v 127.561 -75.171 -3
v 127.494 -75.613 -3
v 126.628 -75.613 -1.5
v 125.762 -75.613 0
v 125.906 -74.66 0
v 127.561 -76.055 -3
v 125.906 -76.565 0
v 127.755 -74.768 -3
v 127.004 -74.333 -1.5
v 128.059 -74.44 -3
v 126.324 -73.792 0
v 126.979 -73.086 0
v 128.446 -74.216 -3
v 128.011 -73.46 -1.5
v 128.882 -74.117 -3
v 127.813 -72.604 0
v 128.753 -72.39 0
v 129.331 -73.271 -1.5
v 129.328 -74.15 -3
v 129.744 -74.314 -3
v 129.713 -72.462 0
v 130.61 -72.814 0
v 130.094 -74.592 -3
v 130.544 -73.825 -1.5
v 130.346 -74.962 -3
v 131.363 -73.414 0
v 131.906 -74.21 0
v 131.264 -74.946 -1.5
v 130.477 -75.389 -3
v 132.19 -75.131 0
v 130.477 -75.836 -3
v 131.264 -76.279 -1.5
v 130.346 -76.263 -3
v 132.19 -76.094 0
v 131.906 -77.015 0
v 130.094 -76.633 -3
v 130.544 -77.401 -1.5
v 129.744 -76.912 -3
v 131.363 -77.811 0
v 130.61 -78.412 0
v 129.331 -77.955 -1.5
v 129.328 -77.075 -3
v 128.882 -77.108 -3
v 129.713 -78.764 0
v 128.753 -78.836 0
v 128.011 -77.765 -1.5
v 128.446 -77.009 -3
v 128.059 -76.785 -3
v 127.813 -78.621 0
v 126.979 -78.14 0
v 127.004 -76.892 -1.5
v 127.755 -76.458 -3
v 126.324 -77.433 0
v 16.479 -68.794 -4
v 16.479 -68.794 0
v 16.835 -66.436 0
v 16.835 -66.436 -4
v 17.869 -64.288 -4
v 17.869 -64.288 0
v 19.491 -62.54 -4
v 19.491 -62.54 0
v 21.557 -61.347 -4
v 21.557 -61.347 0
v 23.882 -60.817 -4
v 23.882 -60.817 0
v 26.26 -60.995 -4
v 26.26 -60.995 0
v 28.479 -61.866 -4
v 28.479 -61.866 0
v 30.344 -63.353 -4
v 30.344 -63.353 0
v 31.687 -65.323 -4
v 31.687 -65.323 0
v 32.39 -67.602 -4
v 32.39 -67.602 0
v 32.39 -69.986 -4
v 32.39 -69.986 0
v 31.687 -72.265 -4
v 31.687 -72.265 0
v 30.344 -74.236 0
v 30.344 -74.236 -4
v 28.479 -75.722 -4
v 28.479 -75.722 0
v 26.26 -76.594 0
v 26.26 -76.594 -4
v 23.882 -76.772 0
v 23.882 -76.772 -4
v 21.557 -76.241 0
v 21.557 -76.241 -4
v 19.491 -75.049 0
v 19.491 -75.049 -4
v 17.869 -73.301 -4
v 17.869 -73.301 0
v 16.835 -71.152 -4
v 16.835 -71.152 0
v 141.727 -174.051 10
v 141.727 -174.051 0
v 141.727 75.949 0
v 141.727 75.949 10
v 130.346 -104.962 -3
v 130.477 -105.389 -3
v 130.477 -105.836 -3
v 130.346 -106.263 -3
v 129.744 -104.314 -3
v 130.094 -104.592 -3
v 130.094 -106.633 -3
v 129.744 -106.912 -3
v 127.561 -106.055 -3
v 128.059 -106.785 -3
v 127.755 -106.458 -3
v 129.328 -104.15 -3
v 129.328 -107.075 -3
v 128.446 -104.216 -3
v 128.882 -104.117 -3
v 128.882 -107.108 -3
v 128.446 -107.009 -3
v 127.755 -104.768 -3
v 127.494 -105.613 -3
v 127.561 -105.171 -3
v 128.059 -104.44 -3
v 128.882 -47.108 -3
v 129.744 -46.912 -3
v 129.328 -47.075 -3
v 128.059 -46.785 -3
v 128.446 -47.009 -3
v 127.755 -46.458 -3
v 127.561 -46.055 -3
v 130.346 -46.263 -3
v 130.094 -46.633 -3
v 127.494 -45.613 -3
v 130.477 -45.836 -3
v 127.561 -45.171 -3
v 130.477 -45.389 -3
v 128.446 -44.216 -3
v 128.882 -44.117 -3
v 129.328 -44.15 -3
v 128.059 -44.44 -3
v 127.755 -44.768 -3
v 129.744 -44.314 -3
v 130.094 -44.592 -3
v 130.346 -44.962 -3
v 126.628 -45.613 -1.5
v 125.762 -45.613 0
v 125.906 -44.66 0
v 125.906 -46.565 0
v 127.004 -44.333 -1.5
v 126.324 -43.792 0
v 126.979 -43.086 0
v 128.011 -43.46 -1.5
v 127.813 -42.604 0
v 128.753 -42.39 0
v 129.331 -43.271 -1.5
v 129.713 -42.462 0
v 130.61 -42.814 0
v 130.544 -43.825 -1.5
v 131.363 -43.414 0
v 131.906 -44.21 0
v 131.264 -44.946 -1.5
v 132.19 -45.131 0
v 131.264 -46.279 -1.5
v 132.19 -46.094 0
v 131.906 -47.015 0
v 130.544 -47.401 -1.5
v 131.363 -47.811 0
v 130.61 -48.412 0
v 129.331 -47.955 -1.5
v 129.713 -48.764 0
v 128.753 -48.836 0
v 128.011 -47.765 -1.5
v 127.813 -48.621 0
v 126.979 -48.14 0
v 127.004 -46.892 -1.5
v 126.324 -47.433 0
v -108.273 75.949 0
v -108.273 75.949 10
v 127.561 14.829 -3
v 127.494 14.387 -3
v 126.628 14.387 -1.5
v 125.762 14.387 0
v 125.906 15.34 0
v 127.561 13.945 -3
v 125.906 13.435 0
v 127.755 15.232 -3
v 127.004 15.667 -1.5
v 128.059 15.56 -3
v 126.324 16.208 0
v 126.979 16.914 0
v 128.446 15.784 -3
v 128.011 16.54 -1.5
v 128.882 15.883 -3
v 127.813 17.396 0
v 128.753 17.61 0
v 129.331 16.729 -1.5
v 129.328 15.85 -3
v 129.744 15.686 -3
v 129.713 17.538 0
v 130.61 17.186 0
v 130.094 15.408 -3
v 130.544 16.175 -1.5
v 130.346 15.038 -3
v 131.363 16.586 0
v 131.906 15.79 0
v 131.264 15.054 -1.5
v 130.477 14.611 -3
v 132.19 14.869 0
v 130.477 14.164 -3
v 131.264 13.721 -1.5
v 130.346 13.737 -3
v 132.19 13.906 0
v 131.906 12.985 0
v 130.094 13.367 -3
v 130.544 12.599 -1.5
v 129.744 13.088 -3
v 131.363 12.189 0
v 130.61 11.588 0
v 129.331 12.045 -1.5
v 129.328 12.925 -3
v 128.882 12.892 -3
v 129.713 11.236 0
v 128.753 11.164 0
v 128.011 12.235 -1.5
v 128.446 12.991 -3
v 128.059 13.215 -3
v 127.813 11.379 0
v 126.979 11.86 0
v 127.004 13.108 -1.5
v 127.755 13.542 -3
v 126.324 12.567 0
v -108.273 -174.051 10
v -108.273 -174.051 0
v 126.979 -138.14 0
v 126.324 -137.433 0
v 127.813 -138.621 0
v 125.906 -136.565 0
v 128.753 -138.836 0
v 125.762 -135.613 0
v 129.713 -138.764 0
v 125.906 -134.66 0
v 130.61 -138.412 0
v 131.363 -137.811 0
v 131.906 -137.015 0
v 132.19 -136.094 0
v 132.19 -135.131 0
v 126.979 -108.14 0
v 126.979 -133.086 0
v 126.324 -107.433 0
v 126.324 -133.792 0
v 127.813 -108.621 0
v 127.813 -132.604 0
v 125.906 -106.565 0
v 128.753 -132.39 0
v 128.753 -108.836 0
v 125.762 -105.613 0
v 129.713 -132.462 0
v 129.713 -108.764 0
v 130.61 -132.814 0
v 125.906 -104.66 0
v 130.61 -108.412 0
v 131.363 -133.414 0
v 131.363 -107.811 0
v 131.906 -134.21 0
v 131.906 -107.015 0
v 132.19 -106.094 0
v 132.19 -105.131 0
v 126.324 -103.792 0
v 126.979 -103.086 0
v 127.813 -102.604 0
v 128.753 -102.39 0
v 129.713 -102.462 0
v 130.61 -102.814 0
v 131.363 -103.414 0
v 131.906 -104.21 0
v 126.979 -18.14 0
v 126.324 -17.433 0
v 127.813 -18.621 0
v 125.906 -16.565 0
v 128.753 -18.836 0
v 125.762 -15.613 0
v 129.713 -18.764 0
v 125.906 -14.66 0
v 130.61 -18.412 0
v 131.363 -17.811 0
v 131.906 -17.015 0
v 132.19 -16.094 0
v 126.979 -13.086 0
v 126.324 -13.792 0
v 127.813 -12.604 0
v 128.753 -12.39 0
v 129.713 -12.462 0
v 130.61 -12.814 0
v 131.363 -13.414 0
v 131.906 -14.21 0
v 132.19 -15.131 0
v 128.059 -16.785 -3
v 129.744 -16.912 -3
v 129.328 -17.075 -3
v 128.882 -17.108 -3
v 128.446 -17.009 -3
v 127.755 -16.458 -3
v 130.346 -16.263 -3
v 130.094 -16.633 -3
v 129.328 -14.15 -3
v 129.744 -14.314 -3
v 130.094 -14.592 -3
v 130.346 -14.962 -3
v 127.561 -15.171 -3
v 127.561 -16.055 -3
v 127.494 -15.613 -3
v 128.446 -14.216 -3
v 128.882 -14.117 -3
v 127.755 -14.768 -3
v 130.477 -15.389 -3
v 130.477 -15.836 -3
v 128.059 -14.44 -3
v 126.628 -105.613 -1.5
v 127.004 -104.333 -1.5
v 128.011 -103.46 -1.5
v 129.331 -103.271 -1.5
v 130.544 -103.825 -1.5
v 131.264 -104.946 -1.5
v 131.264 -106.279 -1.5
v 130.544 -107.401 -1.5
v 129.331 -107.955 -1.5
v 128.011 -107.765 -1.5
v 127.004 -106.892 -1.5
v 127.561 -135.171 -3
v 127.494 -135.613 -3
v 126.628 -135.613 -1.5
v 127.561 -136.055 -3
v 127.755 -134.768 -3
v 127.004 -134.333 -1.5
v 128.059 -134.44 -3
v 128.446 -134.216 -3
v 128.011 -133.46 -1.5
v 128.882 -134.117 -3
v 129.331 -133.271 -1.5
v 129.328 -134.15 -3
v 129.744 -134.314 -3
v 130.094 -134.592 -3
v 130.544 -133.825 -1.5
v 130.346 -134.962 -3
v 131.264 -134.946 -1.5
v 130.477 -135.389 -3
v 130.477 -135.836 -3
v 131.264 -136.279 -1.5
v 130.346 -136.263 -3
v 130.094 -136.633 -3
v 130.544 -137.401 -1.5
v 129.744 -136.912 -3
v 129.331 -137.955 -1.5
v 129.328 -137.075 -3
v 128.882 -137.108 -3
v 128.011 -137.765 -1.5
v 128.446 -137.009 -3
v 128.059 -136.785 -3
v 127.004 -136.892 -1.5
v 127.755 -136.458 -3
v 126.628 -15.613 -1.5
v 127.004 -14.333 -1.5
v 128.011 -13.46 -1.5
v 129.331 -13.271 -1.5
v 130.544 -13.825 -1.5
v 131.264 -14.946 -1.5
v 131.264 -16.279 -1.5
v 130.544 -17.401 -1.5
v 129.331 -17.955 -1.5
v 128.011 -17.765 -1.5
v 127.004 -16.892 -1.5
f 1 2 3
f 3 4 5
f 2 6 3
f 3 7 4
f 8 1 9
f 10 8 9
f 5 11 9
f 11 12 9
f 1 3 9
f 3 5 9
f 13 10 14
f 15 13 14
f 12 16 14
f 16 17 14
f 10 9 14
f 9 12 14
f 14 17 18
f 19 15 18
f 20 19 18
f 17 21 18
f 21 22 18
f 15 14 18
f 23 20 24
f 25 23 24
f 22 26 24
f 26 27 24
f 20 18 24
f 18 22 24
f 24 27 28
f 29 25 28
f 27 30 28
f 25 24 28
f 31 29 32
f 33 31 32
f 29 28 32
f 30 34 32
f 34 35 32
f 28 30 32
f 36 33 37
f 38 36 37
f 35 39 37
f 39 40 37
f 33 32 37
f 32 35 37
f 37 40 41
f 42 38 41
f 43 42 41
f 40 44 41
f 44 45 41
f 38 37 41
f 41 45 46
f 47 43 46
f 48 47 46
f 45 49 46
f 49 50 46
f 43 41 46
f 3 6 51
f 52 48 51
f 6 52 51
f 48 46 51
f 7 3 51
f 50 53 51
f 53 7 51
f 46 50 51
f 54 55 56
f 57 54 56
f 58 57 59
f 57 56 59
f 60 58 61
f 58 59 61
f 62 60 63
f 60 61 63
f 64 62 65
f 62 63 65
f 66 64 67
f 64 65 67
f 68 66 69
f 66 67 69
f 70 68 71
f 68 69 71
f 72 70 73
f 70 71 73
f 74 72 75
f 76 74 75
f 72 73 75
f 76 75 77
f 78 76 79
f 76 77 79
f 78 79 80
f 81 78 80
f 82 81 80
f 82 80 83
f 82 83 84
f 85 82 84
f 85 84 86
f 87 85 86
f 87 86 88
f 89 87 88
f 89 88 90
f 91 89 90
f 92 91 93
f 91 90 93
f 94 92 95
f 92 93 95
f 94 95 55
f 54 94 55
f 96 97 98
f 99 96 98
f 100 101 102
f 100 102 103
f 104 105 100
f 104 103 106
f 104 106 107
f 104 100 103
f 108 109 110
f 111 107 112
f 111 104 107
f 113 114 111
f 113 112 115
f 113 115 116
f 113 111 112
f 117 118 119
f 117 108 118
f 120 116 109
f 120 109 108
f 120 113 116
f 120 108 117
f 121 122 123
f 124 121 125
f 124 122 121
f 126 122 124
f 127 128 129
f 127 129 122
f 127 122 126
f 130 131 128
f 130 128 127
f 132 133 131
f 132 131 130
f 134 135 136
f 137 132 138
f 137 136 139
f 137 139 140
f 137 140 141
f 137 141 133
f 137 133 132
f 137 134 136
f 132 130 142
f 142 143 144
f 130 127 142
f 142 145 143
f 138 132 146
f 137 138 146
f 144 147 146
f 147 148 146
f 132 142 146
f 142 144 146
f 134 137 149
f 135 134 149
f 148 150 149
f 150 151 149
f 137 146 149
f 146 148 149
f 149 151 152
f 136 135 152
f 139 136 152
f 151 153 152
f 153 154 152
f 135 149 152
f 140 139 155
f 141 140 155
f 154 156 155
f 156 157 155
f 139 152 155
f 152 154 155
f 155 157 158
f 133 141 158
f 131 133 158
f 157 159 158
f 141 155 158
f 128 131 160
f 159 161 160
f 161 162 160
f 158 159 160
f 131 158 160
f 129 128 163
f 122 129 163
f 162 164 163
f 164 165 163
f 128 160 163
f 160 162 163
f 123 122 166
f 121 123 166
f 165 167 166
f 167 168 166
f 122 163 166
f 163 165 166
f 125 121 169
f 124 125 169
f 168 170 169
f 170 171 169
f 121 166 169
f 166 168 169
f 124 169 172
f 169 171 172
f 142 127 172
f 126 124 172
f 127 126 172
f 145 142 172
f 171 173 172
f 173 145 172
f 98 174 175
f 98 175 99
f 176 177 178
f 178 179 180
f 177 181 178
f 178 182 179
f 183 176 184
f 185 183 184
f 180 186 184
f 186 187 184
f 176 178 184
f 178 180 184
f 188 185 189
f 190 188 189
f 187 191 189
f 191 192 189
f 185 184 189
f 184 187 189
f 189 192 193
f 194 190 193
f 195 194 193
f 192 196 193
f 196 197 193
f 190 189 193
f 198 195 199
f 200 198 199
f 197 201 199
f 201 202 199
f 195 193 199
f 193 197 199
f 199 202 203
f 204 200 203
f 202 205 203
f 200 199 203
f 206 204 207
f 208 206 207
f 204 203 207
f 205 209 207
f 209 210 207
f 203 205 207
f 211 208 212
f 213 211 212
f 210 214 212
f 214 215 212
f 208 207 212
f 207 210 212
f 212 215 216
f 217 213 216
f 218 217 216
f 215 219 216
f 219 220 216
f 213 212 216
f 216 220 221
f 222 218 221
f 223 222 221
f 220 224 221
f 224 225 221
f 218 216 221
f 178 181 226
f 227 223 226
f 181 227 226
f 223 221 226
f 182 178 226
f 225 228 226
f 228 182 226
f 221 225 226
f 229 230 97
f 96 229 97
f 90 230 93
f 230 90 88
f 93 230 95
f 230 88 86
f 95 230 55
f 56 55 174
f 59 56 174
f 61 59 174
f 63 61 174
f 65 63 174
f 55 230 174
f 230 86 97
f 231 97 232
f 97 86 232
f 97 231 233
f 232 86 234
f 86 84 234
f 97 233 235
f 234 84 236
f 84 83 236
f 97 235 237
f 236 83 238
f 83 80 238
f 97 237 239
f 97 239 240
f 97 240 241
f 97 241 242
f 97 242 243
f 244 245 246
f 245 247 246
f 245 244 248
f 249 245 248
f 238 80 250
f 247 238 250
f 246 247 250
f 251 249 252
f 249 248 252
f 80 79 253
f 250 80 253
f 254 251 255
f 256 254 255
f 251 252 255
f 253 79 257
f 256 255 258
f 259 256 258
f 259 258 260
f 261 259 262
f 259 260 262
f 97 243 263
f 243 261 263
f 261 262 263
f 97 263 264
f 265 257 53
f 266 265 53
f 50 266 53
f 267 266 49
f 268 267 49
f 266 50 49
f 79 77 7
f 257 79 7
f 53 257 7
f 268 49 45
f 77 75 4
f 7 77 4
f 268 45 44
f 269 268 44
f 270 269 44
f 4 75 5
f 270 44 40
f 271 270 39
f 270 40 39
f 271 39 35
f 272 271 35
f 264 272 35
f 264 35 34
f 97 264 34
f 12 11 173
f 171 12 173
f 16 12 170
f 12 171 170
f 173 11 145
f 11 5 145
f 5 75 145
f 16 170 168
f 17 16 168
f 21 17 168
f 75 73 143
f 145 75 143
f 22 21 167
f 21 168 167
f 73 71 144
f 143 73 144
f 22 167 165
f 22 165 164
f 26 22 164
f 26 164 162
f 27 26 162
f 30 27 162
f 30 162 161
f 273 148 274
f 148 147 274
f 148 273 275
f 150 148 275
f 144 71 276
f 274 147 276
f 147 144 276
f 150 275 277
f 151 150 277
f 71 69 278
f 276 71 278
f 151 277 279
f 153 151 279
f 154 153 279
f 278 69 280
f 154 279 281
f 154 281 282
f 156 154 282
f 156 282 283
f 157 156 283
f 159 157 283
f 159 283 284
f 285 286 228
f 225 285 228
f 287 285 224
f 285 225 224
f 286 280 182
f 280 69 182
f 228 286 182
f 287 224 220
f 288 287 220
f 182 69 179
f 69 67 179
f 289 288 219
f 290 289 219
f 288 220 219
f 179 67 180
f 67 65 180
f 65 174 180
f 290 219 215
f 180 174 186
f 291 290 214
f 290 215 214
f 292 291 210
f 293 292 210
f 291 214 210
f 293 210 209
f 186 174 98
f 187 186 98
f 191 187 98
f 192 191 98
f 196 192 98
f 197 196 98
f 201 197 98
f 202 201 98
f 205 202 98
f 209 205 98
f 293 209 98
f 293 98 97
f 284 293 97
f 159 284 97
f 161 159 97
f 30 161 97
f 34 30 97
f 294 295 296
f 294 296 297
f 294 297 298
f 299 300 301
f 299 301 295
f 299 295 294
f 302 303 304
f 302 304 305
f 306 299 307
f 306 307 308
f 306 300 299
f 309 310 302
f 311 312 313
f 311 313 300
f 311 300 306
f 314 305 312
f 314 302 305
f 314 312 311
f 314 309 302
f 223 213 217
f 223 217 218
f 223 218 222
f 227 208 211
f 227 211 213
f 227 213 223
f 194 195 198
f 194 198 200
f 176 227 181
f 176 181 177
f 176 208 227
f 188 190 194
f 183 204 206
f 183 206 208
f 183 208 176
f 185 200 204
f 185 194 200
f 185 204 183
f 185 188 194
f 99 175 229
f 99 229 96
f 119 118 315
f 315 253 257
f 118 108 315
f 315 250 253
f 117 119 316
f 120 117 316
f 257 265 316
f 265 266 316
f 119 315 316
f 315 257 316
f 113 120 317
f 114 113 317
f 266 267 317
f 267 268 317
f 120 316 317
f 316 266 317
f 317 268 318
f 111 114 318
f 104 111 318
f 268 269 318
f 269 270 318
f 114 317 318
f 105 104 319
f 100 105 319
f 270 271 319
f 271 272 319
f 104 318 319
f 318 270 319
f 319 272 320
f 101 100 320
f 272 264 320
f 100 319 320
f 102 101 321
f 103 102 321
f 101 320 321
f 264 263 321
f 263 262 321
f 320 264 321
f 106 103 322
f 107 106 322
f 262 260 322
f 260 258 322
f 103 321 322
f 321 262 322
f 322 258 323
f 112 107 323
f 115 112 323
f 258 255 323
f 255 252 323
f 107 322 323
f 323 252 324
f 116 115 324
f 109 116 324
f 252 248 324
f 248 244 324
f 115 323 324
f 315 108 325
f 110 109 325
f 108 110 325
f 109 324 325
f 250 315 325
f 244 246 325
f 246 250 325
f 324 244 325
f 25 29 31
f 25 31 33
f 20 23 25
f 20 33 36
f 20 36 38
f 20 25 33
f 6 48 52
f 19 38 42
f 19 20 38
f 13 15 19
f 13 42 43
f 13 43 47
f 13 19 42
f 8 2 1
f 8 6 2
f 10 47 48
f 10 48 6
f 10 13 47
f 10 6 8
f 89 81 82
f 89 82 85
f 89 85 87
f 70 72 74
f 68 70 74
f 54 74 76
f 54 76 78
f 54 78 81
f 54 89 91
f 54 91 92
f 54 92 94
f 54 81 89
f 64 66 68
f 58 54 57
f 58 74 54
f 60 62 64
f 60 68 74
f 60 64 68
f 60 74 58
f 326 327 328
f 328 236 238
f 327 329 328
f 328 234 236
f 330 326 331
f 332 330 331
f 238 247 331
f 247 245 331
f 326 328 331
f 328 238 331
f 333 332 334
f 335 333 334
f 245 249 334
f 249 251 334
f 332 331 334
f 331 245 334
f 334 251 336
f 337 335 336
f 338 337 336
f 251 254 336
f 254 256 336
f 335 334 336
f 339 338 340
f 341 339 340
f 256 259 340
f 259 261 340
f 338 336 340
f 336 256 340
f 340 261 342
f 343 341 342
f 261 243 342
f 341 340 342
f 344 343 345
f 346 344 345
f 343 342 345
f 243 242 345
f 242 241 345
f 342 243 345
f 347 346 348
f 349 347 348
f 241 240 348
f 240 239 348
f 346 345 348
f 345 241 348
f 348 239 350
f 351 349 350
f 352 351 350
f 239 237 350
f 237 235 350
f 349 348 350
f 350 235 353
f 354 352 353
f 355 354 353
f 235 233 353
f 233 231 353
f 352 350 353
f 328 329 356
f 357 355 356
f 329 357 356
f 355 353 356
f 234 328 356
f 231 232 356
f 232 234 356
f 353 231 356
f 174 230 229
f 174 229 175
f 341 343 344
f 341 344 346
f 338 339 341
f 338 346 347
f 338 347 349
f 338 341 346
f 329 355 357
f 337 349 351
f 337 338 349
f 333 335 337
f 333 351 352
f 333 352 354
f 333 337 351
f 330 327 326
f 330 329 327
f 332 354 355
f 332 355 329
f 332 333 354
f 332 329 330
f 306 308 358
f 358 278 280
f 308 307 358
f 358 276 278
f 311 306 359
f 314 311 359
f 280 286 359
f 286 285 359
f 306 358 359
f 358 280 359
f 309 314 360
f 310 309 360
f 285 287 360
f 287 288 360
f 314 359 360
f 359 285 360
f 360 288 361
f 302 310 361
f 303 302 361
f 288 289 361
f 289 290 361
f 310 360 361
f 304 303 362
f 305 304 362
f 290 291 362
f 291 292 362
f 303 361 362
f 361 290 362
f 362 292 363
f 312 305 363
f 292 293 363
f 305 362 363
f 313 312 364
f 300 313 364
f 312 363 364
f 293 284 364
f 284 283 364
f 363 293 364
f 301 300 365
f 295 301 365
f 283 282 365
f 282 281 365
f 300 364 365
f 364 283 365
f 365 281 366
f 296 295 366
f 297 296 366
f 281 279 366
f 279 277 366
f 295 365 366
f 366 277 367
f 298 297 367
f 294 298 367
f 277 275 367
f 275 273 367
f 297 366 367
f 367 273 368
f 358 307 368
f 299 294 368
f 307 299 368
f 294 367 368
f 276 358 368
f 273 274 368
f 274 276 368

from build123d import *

# Parameters (mm, degrees)
SKETCH_1_W             = 250
SKETCH_1_H             = 250
EXTRUDE_1_DEPTH        = 10
SKETCH_4_R             = 8
EXTRUDE_2_DEPTH        = 4
SKETCH_6_R             = 1.5
EXTRUDE_3_DEPTH        = 3
PATTERN_LINEAR_1_COUNT = 6
PATTERN_LINEAR_1_PITCH = 30
DRAFT_1_ANGLE          = 30
PATTERN_LINEAR_2_COUNT = 6
PATTERN_LINEAR_2_PITCH = 30
DRAFT_2_ANGLE          = 30
DRAFT_3_ANGLE          = 30
DRAFT_4_ANGLE          = 30
DRAFT_5_ANGLE          = 30
DRAFT_6_ANGLE          = 30


with BuildPart() as part:
    # 草图1 → 凸台-拉伸1 (new body)
    with BuildSketch(Plane.XY):
        with Locations((16.726943942, -49.050632911)):
            Rectangle(SKETCH_1_W, SKETCH_1_H)
    extrude(amount=EXTRUDE_1_DEPTH)

    # 草图4 → 凸台-拉伸2 (add)
    with BuildSketch(Plane(origin=(0, 0, 0), x_dir=(-1, 0, 0), z_dir=(0, 0, -1))):
        with Locations((-24.479358253, -68.79415652)):
            Circle(SKETCH_4_R)
    extrude(amount=EXTRUDE_2_DEPTH)

    # 草图6 → 凸台-拉伸3 (add)
    with BuildSketch(Plane(origin=(0, 0, 0), x_dir=(-1, 0, 0), z_dir=(0, 0, -1))):
        with Locations((-128.994191702, 14.387355328)):
            Circle(SKETCH_6_R)
    extrude_3 = extrude(amount=EXTRUDE_3_DEPTH)

    # 阵列(线性)1: 凸台-拉伸3 ×6
    with Locations(*[(0, -i * PATTERN_LINEAR_1_PITCH, 0) for i in range(1, PATTERN_LINEAR_1_COUNT)]):
        add(extrude_3)

    # 拔模1
    draft_1_faces = [part.faces().sort_by_distance(p)[0] for p in [
        (130.494191702, 14.387355328, -1.5),
    ]]
    draft(draft_1_faces, Plane(origin=(128.994191702, 14.387355328, -3), x_dir=(-1, 0, 0), z_dir=(0, 0, -1)), DRAFT_1_ANGLE)

    # 阵列(线性)2: 凸台-拉伸3 ×6
    with Locations(*[(0, -i * PATTERN_LINEAR_2_PITCH, 0) for i in range(1, PATTERN_LINEAR_2_COUNT)]):
        add(extrude_3)

    # 拔模2
    draft_2_faces = [part.faces().sort_by_distance(p)[0] for p in [
        (130.494191702, -15.612644672, -1.5),
    ]]
    draft(draft_2_faces, Plane(origin=(128.994191702, -15.612644672, -3), x_dir=(-1, 0, 0), z_dir=(0, 0, -1)), DRAFT_2_ANGLE)

    # 拔模3
    draft_3_faces = [part.faces().sort_by_distance(p)[0] for p in [
        (130.494191702, -45.612644672, -1.5),
    ]]
    draft(draft_3_faces, Plane(origin=(128.994191702, -45.612644672, -3), x_dir=(-1, 0, 0), z_dir=(0, 0, -1)), DRAFT_3_ANGLE)

    # 拔模4
    draft_4_faces = [part.faces().sort_by_distance(p)[0] for p in [
        (130.494191702, -75.612644672, -1.5),
    ]]
    draft(draft_4_faces, Plane(origin=(128.994191702, -75.612644672, -3), x_dir=(-1, 0, 0), z_dir=(0, 0, -1)), DRAFT_4_ANGLE)

    # 拔模5
    draft_5_faces = [part.faces().sort_by_distance(p)[0] for p in [
        (130.494191702, -105.612644672, -1.5),
    ]]
    draft(draft_5_faces, Plane(origin=(128.994191702, -105.612644672, -3), x_dir=(-1, 0, 0), z_dir=(0, 0, -1)), DRAFT_5_ANGLE)

    # 拔模6
    draft_6_faces = [part.faces().sort_by_distance(p)[0] for p in [
        (130.494191702, -135.612644672, -1.5),
    ]]
    draft(draft_6_faces, Plane(origin=(128.994191702, -135.612644672, -3), x_dir=(-1, 0, 0), z_dir=(0, 0, -1)), DRAFT_6_ANGLE)


solid = part.part
